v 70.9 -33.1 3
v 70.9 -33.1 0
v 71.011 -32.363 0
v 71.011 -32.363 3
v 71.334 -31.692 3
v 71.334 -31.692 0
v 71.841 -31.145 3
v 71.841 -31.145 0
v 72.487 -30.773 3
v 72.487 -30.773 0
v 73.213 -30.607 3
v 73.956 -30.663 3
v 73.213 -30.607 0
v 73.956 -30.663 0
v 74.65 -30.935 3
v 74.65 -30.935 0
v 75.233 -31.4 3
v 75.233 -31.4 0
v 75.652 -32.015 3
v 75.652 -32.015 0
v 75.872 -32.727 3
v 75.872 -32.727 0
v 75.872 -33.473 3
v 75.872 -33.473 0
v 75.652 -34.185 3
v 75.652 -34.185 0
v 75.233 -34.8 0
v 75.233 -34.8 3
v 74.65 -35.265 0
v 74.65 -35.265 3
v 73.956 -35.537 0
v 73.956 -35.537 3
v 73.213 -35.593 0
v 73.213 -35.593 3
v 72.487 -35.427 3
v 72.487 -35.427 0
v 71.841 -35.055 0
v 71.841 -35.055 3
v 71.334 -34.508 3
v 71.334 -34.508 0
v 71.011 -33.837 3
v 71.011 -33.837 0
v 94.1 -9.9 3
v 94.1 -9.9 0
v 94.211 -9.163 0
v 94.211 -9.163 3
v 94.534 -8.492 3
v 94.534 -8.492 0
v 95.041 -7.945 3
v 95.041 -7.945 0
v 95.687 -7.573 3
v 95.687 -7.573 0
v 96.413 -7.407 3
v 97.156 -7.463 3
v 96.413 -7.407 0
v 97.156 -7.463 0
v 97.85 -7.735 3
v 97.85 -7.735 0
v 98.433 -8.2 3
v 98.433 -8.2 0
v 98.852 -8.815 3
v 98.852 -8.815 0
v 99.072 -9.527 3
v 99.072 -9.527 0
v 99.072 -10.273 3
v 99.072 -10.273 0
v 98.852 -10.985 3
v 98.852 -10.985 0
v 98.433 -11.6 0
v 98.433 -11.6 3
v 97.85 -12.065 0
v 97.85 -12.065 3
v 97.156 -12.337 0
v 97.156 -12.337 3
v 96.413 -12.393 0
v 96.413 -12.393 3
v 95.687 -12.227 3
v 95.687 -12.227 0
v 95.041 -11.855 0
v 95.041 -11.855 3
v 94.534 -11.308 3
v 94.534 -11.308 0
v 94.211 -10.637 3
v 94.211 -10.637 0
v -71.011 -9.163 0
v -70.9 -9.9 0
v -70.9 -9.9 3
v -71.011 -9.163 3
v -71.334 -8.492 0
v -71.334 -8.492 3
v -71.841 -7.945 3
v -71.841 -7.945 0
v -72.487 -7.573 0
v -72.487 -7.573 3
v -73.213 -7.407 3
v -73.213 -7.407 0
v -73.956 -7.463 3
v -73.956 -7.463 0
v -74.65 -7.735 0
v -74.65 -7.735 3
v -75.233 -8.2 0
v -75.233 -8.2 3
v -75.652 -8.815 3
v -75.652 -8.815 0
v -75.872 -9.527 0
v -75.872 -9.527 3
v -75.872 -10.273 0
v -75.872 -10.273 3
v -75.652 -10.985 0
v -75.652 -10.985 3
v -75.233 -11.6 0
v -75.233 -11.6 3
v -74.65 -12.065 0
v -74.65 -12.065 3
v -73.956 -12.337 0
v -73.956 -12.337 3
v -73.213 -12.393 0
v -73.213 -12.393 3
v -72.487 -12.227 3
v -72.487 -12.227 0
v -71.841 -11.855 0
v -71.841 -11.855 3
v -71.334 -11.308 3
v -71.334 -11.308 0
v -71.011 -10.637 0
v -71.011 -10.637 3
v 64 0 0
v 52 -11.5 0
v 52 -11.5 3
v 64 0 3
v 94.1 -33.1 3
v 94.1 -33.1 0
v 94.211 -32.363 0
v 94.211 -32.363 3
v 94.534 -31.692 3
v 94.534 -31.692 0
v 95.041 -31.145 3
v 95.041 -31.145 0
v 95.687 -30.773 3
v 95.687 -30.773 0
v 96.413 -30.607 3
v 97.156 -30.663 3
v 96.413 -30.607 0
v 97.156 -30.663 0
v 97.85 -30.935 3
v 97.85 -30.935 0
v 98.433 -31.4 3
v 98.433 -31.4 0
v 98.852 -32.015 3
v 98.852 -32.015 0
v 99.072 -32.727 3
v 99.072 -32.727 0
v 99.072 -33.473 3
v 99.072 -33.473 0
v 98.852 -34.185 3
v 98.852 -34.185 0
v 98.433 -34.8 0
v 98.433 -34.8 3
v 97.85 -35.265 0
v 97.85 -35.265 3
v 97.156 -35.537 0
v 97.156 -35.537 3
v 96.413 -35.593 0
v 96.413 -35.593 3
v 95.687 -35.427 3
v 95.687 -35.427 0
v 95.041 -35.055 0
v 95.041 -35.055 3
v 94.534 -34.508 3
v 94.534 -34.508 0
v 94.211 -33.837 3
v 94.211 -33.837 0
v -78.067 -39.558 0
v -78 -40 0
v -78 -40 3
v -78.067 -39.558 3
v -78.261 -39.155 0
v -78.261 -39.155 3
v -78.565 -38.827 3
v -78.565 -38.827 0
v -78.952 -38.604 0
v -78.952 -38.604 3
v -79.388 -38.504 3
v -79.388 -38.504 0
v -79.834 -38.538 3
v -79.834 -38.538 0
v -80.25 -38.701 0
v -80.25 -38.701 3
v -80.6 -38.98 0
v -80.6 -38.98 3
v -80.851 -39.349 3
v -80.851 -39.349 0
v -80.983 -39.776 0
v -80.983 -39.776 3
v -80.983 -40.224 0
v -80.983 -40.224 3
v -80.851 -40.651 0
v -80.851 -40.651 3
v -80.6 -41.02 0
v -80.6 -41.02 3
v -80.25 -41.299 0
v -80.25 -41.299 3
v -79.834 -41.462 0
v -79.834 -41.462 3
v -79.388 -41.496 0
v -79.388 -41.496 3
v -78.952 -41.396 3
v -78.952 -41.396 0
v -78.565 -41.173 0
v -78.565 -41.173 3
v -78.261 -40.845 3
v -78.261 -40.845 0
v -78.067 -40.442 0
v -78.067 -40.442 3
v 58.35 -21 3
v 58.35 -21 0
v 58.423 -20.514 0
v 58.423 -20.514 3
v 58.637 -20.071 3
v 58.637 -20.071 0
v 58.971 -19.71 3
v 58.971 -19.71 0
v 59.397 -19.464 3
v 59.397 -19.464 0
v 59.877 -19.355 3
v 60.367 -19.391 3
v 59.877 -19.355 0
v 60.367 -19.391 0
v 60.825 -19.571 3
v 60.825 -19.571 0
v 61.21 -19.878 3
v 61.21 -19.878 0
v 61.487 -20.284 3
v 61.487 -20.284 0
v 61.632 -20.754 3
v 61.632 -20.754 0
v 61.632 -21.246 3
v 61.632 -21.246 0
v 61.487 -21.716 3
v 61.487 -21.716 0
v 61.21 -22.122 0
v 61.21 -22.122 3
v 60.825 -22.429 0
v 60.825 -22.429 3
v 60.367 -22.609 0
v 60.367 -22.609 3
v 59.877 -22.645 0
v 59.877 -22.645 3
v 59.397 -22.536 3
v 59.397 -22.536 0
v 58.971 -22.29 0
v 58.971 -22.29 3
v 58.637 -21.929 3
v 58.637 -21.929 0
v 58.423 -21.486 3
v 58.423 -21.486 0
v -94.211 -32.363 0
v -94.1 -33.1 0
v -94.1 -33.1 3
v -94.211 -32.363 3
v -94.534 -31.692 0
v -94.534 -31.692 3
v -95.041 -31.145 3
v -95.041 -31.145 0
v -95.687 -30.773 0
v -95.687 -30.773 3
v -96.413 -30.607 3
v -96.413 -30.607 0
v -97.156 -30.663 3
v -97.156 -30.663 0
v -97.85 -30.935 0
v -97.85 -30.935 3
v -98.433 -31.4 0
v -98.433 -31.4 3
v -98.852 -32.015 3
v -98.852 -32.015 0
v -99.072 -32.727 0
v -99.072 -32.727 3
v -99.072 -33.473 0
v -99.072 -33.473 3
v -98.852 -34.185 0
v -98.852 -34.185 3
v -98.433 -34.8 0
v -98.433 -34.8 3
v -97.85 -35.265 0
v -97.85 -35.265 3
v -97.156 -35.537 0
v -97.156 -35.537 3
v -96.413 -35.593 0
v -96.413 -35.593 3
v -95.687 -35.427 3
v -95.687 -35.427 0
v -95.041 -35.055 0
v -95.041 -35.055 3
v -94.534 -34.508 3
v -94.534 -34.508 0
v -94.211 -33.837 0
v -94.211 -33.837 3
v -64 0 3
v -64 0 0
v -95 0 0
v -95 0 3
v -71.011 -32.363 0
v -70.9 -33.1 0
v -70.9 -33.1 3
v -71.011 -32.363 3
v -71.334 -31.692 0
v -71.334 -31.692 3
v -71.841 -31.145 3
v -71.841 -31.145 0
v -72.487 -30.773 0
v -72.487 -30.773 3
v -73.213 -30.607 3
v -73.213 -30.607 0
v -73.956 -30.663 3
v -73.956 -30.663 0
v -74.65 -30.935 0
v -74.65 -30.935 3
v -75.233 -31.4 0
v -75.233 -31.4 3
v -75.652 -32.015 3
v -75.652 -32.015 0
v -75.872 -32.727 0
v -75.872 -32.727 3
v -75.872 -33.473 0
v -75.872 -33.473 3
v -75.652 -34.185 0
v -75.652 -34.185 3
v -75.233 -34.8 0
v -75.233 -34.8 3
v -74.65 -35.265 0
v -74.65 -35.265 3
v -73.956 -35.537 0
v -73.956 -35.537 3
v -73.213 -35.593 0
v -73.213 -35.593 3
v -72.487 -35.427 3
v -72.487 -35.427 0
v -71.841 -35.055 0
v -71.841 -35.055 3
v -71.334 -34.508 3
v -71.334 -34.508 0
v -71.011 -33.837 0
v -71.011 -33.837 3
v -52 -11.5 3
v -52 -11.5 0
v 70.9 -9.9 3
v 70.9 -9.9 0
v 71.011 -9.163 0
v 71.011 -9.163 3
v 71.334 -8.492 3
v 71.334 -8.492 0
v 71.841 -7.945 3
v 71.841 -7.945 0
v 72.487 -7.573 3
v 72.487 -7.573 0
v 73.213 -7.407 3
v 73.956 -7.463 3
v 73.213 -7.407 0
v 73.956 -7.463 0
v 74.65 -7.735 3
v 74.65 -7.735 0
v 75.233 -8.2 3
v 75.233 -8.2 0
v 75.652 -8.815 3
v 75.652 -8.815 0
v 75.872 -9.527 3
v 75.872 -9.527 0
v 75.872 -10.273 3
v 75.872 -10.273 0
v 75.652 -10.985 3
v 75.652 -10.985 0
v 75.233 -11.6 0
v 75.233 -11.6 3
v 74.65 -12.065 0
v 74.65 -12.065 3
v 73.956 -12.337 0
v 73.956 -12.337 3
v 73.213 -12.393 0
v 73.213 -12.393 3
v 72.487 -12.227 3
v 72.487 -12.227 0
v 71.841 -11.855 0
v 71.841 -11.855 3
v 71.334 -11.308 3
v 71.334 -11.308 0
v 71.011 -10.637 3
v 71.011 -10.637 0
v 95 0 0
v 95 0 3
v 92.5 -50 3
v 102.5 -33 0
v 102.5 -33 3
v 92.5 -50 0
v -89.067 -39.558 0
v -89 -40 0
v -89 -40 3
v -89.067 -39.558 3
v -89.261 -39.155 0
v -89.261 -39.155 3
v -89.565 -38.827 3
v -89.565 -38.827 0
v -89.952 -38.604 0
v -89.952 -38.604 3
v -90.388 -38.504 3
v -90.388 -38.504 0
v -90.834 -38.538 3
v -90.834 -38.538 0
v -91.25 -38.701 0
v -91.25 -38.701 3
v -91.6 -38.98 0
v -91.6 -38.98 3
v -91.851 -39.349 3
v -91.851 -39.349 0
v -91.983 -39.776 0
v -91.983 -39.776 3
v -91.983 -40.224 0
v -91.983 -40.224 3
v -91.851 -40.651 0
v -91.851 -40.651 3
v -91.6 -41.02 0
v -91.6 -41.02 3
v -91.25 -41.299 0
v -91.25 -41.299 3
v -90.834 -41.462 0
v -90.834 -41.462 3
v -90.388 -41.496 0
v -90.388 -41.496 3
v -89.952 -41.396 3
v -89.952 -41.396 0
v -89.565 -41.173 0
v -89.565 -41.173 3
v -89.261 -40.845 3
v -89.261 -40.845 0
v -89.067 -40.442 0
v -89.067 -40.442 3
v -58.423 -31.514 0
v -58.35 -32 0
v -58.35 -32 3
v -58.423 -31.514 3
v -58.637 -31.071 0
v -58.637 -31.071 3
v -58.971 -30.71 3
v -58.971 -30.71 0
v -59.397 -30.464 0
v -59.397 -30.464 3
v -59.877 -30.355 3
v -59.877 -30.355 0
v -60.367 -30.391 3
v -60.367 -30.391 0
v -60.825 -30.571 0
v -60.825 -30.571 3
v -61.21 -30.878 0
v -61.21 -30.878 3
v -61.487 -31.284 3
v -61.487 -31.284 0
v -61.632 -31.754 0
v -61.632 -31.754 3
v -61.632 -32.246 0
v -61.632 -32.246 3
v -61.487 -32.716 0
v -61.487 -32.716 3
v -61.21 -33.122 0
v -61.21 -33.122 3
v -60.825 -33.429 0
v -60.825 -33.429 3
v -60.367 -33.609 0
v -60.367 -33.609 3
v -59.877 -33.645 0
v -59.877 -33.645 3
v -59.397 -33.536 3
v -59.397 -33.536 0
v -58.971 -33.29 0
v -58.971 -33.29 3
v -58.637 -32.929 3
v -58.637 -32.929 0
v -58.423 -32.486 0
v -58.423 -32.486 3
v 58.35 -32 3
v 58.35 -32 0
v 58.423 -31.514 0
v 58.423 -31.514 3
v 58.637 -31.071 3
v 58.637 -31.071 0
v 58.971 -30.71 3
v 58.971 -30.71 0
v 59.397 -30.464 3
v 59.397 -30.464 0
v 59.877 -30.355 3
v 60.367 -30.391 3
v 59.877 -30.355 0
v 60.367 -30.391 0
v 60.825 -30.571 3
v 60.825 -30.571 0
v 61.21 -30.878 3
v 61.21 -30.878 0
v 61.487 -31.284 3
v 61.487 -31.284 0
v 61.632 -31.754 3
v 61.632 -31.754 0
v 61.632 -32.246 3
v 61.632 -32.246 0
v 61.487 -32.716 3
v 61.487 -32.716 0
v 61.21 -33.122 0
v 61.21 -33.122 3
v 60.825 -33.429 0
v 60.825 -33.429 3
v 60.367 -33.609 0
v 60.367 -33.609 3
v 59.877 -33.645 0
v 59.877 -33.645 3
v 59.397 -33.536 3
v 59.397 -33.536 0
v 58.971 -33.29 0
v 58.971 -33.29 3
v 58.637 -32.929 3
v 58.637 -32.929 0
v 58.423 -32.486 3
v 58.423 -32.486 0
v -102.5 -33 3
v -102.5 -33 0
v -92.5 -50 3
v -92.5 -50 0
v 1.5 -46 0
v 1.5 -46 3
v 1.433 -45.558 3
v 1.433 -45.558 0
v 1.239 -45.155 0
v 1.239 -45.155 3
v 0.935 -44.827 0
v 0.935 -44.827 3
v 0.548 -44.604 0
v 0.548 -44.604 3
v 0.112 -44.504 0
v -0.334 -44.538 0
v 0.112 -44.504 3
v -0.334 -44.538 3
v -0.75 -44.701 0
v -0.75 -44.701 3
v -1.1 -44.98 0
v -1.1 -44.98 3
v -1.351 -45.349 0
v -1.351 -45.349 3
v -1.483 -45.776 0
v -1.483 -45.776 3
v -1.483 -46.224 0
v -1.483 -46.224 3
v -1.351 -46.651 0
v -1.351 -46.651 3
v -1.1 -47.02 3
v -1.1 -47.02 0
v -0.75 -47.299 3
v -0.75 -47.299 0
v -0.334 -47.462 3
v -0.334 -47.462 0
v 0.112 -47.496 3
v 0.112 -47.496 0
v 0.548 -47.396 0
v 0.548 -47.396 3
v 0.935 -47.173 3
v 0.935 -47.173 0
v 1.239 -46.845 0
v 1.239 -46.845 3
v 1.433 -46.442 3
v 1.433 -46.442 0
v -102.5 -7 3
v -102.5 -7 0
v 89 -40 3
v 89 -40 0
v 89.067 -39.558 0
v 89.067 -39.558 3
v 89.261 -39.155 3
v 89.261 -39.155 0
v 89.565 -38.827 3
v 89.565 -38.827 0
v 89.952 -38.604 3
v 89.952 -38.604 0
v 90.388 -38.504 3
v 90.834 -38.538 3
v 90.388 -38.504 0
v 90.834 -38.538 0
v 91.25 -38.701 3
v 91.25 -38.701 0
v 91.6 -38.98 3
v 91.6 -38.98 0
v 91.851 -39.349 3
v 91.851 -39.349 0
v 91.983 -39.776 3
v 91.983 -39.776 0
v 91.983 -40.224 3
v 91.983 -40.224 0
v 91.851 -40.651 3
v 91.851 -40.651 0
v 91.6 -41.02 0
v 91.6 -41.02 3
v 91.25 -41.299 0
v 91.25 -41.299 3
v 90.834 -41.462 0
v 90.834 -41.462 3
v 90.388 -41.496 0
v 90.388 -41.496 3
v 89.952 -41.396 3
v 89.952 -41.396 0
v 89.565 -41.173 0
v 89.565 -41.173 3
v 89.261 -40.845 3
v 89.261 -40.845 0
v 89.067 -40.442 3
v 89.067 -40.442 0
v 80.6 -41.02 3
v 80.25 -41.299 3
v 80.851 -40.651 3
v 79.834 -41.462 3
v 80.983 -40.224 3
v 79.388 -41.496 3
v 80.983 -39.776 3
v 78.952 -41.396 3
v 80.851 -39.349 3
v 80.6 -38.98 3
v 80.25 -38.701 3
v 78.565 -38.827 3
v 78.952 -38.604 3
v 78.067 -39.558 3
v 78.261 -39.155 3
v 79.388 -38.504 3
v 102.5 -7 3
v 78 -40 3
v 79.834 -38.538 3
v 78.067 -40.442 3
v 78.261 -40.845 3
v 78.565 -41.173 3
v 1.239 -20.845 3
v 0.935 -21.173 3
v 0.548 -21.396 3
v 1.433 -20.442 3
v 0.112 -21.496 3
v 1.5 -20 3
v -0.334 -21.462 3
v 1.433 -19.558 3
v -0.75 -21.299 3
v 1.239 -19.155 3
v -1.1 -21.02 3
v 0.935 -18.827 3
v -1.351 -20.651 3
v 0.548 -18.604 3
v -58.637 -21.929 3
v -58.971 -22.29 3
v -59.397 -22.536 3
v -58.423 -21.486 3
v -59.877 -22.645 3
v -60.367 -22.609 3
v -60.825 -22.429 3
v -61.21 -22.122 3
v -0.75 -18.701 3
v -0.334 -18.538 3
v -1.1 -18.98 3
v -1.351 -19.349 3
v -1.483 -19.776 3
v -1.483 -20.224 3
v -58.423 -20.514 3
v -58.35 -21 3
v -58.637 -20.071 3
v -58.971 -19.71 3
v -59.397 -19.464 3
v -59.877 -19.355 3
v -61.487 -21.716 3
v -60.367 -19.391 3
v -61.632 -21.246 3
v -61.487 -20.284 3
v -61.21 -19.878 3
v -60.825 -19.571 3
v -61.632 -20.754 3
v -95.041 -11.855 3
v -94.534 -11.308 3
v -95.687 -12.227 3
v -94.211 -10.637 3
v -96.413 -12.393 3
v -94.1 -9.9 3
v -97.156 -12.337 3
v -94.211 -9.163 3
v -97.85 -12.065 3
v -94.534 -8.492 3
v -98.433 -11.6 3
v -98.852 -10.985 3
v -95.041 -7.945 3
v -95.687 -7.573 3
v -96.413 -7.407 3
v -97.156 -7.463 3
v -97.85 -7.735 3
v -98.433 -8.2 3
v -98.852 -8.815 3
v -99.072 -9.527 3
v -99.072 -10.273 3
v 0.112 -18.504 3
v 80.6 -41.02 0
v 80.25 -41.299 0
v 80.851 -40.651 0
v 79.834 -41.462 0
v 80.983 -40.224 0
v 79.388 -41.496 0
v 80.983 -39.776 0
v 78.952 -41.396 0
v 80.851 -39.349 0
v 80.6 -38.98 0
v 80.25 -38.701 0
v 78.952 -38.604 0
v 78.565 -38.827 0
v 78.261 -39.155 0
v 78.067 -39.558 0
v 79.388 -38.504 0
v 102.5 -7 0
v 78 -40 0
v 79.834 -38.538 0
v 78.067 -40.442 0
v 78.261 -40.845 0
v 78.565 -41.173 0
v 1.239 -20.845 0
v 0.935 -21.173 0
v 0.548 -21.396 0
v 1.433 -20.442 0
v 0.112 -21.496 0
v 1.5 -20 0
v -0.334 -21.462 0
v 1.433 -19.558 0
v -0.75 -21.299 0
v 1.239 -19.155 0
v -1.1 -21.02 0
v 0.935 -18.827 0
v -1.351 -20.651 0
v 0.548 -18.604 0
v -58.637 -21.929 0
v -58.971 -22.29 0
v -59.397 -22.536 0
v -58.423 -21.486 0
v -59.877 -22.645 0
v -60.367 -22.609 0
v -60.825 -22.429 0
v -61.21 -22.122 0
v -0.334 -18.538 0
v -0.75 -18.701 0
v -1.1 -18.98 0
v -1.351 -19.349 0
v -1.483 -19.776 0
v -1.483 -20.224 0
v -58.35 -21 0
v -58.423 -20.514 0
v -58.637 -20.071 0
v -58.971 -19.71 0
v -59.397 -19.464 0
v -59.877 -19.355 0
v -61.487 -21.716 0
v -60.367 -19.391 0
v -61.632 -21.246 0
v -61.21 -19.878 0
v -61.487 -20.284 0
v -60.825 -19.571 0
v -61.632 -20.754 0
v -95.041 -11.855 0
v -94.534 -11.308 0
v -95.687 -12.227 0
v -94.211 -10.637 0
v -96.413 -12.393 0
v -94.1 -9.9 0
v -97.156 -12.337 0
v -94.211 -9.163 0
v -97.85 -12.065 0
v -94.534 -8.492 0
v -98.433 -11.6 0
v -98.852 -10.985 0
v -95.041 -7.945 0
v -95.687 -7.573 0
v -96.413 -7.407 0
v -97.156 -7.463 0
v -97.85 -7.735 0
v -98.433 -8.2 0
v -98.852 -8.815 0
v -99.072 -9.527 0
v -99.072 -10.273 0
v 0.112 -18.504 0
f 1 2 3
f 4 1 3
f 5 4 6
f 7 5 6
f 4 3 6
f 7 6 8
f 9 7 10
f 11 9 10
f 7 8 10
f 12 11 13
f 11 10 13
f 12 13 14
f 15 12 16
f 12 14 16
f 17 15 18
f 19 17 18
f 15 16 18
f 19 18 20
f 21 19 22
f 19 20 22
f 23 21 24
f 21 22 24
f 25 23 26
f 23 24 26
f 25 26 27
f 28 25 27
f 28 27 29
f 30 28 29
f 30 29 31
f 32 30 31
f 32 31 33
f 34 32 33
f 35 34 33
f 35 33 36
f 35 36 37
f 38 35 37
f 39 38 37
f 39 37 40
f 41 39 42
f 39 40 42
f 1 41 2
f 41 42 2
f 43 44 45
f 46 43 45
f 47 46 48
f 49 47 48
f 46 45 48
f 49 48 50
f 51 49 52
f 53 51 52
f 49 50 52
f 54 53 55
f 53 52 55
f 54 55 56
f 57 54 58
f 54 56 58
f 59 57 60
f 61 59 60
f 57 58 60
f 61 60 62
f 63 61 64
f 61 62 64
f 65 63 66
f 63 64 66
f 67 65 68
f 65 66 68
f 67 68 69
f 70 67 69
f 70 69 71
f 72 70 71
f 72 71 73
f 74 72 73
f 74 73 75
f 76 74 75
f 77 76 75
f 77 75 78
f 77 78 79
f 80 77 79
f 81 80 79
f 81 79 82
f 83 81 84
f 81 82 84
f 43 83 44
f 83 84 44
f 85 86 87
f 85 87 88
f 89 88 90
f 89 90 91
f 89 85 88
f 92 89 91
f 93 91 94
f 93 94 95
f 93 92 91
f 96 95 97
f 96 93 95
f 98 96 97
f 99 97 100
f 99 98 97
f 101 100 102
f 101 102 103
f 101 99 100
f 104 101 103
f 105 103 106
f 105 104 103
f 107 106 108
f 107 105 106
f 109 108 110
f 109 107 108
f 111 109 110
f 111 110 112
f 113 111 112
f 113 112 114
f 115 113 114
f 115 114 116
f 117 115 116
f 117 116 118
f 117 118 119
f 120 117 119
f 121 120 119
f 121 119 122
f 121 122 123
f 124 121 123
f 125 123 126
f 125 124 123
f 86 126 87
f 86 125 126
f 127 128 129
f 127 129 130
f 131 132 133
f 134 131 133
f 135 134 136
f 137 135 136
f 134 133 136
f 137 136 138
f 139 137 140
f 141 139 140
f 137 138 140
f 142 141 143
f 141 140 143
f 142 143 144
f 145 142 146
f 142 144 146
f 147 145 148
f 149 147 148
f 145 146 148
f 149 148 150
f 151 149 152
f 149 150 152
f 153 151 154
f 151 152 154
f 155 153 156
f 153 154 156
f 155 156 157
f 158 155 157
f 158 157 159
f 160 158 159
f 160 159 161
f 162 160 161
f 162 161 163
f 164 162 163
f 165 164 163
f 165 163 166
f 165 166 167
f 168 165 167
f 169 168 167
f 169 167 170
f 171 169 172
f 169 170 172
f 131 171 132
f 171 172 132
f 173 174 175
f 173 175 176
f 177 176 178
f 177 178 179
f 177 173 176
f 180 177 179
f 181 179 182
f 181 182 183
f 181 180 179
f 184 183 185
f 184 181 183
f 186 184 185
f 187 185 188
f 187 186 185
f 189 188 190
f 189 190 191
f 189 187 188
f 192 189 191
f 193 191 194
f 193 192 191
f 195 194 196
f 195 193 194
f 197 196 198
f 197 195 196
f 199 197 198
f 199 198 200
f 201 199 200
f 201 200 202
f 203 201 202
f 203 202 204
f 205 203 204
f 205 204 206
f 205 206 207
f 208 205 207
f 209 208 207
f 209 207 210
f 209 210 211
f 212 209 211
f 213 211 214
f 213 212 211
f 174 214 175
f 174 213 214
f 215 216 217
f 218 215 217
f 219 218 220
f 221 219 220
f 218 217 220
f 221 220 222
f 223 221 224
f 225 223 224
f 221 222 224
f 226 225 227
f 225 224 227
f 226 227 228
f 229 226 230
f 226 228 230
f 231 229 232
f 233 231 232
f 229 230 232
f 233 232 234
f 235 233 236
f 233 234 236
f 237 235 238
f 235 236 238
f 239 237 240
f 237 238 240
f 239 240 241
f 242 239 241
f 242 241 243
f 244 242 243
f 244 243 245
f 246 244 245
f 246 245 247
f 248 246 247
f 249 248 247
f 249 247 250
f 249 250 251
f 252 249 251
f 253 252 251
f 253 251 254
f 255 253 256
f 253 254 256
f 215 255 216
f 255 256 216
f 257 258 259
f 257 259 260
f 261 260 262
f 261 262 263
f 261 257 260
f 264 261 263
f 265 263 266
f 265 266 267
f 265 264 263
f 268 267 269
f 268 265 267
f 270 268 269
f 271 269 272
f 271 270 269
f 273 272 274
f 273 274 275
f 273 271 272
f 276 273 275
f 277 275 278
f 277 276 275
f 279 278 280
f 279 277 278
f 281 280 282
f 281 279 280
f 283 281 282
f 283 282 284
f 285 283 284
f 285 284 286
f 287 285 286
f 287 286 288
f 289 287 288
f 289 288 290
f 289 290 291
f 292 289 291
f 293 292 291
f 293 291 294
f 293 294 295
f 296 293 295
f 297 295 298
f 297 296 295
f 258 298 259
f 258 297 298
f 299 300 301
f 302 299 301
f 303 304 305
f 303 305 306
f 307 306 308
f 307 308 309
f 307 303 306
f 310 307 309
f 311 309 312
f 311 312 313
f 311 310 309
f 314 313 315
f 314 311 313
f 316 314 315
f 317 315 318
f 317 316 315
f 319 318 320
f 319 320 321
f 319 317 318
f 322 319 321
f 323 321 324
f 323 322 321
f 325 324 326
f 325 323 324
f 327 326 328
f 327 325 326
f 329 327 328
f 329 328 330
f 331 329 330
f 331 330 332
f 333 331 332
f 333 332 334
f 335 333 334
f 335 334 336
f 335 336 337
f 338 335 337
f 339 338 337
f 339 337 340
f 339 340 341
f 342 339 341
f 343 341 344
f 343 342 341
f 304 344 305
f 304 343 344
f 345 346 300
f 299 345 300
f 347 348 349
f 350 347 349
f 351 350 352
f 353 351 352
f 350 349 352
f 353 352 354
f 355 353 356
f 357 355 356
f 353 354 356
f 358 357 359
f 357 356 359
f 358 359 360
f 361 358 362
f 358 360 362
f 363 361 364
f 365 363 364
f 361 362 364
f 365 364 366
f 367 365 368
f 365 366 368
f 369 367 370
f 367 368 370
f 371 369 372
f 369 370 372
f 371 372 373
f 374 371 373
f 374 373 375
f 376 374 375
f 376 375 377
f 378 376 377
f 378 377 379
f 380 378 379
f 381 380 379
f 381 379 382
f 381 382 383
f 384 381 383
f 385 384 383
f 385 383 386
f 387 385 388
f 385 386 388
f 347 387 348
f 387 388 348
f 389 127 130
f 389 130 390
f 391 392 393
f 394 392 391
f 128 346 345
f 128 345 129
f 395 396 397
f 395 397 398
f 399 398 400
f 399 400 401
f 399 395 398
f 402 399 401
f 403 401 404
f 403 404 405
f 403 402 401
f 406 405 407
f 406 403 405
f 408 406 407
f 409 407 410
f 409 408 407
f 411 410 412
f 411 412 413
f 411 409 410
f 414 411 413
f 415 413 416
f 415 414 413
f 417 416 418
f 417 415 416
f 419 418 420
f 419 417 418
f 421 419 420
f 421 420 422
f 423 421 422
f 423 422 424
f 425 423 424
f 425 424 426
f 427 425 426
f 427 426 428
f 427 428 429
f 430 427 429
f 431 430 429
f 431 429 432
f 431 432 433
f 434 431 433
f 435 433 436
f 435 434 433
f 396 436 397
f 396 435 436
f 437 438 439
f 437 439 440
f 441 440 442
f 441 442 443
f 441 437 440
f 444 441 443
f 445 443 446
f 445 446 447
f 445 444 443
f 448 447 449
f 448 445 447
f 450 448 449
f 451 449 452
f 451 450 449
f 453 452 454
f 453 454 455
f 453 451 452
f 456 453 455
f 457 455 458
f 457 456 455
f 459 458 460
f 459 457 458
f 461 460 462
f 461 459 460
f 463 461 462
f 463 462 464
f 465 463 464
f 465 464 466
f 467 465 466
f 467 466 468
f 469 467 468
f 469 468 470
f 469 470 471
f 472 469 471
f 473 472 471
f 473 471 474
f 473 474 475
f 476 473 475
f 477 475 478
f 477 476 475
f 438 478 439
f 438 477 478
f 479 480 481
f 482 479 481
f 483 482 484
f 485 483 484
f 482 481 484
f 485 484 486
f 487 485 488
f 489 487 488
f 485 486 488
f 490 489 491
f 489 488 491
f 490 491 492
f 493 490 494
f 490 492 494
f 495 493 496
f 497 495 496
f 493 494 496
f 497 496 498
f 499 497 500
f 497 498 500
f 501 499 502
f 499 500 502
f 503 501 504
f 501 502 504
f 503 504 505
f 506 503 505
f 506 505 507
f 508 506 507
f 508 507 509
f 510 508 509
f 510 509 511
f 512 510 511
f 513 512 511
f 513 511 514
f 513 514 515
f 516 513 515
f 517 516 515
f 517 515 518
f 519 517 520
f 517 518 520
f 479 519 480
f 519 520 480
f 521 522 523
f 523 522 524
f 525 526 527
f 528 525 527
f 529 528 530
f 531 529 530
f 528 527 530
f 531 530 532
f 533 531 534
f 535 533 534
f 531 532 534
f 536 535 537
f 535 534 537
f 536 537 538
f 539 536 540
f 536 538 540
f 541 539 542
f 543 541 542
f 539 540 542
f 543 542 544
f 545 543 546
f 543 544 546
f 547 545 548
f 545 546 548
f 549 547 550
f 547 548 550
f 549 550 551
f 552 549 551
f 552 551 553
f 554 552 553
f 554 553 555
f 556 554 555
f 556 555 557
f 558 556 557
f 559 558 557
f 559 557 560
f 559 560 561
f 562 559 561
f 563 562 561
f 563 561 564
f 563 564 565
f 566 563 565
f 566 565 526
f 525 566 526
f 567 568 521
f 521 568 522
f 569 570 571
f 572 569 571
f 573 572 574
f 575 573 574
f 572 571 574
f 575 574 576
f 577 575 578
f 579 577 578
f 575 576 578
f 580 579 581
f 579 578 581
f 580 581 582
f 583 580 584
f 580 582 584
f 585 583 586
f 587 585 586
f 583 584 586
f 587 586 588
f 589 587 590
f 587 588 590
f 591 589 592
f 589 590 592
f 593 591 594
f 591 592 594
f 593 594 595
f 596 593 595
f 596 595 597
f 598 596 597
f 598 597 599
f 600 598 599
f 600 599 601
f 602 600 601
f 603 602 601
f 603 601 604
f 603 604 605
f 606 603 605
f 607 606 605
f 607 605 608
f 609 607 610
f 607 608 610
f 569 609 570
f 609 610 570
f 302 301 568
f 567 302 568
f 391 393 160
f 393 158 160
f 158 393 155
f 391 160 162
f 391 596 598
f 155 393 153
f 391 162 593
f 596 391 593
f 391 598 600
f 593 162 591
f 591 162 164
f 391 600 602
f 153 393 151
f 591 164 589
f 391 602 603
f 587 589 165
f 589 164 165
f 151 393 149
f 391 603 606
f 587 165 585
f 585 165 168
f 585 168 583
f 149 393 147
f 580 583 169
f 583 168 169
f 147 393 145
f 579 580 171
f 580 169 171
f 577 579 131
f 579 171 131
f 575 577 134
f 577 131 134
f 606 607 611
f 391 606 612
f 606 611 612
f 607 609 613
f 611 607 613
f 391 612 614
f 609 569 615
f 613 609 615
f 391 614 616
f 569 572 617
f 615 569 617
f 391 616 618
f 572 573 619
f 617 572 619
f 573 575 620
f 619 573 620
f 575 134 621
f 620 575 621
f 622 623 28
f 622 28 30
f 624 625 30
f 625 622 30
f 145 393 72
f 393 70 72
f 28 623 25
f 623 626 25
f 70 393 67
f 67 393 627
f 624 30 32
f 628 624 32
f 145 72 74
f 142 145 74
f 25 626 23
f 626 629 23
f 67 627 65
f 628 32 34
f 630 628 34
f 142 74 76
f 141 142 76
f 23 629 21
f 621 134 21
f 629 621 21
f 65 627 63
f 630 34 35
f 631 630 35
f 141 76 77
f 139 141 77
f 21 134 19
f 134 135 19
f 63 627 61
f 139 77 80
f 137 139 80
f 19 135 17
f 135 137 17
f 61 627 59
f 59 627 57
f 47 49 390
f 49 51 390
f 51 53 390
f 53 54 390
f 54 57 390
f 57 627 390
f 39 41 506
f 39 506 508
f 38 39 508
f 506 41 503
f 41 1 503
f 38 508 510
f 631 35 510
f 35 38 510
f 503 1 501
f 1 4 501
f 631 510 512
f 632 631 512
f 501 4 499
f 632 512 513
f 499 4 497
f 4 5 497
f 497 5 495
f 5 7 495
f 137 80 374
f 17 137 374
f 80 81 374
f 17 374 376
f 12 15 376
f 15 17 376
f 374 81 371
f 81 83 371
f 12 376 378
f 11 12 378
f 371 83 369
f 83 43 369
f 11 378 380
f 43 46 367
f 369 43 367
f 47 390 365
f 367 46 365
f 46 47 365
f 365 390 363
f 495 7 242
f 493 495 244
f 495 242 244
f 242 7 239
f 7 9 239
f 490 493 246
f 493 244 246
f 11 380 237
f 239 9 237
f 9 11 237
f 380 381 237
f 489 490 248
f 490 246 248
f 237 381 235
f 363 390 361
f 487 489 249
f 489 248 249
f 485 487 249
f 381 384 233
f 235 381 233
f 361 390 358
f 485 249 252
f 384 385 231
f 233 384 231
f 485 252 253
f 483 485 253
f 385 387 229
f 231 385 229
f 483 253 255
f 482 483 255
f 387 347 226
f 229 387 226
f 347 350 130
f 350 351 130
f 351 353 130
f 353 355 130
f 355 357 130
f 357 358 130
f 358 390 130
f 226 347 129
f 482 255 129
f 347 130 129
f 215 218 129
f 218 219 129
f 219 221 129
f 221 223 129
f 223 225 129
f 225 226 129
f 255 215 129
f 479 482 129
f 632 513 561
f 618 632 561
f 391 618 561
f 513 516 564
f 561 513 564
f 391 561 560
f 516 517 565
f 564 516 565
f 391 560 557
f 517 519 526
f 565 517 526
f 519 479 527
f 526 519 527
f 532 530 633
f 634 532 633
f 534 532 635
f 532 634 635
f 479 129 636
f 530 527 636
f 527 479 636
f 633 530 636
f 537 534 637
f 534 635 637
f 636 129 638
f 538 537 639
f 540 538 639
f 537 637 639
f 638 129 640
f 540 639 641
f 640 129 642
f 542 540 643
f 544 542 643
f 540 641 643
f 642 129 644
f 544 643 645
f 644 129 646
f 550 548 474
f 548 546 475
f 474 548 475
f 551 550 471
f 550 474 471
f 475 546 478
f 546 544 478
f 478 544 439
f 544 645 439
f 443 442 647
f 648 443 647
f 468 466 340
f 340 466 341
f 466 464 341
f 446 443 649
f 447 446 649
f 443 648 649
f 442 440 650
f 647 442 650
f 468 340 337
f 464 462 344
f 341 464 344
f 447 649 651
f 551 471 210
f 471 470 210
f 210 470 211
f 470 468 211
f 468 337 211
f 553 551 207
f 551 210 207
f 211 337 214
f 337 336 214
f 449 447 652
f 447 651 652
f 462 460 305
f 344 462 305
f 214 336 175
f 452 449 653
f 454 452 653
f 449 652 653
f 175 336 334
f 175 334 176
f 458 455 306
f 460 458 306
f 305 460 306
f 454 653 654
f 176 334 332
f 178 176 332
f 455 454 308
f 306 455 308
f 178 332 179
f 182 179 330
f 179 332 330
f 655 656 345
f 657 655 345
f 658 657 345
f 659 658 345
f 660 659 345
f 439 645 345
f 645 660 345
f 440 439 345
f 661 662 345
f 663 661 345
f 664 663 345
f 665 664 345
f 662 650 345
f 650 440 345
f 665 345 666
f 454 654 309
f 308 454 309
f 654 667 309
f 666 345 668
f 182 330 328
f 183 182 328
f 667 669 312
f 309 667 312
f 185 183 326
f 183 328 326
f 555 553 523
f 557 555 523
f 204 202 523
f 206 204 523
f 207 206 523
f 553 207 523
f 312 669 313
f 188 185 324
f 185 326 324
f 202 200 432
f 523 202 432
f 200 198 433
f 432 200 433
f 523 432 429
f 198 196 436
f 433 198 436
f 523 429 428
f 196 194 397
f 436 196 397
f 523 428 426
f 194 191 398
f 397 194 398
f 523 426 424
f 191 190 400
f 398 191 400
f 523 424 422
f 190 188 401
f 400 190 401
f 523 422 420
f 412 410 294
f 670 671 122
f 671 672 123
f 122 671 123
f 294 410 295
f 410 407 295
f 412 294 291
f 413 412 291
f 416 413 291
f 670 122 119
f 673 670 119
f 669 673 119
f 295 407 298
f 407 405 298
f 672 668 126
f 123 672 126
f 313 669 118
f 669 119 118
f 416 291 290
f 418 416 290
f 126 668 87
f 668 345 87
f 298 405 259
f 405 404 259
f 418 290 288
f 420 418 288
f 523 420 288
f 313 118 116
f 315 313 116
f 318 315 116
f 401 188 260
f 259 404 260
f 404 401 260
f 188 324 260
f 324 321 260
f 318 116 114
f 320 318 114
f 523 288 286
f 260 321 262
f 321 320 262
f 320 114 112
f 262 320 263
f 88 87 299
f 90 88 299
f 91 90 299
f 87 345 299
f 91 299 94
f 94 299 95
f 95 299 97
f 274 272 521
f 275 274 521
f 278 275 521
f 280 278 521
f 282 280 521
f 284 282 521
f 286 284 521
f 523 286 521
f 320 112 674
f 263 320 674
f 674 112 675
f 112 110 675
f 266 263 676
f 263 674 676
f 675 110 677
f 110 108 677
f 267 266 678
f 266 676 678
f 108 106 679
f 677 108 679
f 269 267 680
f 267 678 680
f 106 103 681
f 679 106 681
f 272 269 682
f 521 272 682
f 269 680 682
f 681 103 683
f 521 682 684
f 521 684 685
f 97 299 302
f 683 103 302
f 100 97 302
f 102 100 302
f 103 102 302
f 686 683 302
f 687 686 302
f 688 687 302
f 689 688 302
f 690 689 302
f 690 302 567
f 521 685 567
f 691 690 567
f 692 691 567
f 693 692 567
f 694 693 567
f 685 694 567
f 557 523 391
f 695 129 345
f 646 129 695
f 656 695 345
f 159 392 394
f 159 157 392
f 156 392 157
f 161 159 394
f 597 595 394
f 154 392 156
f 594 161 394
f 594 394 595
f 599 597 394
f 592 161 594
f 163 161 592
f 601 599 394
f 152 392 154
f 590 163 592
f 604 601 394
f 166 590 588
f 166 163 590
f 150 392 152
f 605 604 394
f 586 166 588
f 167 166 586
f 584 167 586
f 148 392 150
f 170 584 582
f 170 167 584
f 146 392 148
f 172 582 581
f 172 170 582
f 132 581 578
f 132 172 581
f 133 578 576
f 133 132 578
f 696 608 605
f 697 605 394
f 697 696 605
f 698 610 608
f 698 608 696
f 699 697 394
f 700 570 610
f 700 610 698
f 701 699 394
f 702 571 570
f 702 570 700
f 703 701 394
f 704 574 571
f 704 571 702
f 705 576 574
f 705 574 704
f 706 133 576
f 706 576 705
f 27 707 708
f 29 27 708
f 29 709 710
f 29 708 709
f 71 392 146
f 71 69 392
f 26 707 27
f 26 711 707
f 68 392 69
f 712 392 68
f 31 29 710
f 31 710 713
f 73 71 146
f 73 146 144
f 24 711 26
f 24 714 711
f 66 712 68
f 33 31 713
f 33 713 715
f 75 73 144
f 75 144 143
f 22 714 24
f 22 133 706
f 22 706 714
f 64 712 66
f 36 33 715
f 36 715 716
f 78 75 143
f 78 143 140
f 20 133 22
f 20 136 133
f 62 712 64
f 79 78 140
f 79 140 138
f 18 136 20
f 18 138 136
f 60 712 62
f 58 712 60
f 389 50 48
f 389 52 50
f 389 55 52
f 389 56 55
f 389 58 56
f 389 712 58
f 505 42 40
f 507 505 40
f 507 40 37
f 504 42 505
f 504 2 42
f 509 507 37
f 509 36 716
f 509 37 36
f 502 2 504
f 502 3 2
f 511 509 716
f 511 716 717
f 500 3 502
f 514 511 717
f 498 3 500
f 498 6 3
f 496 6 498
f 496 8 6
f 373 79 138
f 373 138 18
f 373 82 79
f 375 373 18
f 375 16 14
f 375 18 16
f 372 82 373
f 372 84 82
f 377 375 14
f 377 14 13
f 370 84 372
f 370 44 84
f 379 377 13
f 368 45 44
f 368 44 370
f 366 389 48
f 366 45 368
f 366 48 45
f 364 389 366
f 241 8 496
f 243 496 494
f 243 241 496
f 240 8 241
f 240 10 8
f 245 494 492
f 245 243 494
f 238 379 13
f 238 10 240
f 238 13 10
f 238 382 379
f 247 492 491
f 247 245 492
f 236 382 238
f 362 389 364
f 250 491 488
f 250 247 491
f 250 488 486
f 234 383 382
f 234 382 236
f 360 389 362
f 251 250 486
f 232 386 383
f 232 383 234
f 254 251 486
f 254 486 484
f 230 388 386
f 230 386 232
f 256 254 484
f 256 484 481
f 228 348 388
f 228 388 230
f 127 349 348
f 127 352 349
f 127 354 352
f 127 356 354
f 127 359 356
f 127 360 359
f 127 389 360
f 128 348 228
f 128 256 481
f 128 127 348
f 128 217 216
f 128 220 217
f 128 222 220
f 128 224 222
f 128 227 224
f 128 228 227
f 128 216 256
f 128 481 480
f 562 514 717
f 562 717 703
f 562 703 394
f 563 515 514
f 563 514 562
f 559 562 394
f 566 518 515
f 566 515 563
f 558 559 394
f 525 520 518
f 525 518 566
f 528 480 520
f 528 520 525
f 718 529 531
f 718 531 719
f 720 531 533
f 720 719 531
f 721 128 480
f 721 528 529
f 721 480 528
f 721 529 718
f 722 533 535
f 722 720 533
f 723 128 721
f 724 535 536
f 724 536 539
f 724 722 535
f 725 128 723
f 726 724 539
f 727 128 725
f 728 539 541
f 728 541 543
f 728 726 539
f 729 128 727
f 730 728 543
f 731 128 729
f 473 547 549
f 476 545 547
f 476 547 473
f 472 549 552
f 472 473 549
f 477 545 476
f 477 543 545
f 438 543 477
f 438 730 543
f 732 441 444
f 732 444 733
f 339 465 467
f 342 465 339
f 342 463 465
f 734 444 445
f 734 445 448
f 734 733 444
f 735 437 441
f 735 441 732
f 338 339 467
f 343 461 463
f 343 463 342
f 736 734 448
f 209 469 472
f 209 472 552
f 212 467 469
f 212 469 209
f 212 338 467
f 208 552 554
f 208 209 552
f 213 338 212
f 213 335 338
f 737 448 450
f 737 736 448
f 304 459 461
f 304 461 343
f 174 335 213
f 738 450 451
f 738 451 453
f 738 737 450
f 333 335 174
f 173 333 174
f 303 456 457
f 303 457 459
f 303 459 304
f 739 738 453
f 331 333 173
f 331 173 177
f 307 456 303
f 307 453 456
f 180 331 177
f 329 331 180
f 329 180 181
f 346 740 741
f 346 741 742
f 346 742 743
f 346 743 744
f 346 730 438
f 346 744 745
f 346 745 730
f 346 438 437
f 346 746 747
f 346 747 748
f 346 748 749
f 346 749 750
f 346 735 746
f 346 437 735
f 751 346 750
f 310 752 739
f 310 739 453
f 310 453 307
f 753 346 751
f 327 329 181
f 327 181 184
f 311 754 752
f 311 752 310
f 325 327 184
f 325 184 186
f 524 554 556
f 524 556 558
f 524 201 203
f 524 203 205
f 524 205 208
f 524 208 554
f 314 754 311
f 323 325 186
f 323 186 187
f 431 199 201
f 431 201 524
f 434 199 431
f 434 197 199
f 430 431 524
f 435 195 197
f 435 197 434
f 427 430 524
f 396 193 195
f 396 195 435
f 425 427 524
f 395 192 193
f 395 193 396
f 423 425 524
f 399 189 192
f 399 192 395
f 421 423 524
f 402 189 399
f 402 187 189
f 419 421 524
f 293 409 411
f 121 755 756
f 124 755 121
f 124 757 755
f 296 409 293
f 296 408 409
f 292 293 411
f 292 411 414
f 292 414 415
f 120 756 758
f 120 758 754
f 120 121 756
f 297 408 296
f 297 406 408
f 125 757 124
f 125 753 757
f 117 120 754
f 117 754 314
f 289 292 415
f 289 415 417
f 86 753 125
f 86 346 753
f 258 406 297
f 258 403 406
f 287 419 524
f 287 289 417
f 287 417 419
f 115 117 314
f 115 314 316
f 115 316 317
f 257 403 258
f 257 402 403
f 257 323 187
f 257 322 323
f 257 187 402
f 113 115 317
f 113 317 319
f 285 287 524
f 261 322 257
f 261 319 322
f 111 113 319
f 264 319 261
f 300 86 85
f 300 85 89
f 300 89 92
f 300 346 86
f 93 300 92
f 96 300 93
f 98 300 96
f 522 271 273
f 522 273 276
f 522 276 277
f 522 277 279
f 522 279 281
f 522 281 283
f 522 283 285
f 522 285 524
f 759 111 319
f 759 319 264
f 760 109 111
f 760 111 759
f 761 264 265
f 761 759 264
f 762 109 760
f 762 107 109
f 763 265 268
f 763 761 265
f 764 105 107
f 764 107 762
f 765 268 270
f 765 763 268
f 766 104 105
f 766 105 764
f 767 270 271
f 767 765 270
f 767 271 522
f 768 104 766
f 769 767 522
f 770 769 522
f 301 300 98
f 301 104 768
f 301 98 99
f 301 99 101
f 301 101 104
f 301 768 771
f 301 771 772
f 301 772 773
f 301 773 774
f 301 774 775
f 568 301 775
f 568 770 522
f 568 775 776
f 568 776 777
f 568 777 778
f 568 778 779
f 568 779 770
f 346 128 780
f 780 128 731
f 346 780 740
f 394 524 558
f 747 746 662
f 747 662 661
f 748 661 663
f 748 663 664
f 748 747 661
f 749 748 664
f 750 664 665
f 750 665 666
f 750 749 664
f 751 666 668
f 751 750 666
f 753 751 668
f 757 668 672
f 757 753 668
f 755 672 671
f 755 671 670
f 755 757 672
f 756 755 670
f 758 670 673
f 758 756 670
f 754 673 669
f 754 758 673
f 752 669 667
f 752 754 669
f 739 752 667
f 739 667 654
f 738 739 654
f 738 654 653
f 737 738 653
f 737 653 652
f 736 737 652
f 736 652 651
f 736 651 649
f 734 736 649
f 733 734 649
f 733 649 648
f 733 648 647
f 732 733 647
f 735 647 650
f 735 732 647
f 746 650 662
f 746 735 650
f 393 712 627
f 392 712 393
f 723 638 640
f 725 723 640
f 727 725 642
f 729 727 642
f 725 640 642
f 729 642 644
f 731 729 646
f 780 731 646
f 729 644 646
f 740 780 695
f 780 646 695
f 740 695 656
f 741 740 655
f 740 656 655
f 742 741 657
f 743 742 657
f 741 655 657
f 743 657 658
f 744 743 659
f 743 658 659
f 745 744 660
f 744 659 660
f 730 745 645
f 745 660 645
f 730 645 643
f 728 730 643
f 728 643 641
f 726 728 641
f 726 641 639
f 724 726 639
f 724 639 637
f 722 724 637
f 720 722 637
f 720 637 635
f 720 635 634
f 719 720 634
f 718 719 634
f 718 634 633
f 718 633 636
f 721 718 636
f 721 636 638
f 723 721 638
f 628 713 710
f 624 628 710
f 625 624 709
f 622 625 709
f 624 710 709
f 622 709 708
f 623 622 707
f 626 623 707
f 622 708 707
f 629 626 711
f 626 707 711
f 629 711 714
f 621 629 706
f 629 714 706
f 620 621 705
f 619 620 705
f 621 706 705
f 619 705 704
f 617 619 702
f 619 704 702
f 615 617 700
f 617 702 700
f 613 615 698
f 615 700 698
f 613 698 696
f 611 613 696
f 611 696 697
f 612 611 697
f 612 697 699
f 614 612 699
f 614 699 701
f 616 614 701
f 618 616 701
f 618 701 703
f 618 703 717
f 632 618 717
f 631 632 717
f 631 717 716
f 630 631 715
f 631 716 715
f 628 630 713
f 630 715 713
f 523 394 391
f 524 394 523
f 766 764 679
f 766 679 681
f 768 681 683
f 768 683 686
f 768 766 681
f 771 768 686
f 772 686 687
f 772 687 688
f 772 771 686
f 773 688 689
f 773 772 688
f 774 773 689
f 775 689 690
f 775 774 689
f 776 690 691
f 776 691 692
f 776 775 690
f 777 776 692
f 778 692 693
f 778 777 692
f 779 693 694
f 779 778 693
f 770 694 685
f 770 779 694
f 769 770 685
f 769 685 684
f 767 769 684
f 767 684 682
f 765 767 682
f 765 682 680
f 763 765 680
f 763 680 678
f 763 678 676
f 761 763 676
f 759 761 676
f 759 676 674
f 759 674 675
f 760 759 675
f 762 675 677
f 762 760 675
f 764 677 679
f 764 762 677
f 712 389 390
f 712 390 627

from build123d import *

# Parameters (mm, degrees)
SKETCH_R     = 2.5
SKETCH_R_2   = 1.5
SKETCH_R_3   = 1.65
PAD_DEPTH    = 3
SKETCH001_R  = 1.5
POCKET_DEPTH = 3.001


with BuildPart() as part:
    # Sketch → Pad (new body)
    with BuildSketch(Plane.XY):
        Polygon((0, -11.5), (-52, -11.5), (-64, 0), (-95, 0), (-102.5, -7), (-102.5, -33), (-92.5, -50), (0, -50), align=None)
        with Locations((-96.6, -9.9)):
            Circle(SKETCH_R, mode=Mode.SUBTRACT)
        with Locations((-73.4, -9.9)):
            Circle(SKETCH_R, mode=Mode.SUBTRACT)
        with Locations((-73.4, -33.1)):
            Circle(SKETCH_R, mode=Mode.SUBTRACT)
        with Locations((-96.6, -33.1)):
            Circle(SKETCH_R, mode=Mode.SUBTRACT)
        with Locations((-90.5, -40)):
            Circle(SKETCH_R_2, mode=Mode.SUBTRACT)
        with Locations((-79.5, -40)):
            Circle(SKETCH_R_2, mode=Mode.SUBTRACT)
        with Locations((-60, -21)):
            Circle(SKETCH_R_3, mode=Mode.SUBTRACT)
        with Locations((-60, -32)):
            Circle(SKETCH_R_3, mode=Mode.SUBTRACT)
    pad = extrude(amount=PAD_DEPTH)

    # Mirrored: Pad across Sketch V_Axis
    add(pad.mirror(Plane(origin=(0, 0, 0), x_dir=(0, 0, 1), z_dir=(1, 0, 0))))

    # Sketch001 → Pocket (cut, through all)
    with BuildSketch(Plane.XY.offset(3)):
        with Locations((0, -20)):
            Circle(SKETCH001_R)
        with Locations((0, -46)):
            Circle(SKETCH001_R)
    extrude(amount=-POCKET_DEPTH, mode=Mode.SUBTRACT)


solid = part.part
